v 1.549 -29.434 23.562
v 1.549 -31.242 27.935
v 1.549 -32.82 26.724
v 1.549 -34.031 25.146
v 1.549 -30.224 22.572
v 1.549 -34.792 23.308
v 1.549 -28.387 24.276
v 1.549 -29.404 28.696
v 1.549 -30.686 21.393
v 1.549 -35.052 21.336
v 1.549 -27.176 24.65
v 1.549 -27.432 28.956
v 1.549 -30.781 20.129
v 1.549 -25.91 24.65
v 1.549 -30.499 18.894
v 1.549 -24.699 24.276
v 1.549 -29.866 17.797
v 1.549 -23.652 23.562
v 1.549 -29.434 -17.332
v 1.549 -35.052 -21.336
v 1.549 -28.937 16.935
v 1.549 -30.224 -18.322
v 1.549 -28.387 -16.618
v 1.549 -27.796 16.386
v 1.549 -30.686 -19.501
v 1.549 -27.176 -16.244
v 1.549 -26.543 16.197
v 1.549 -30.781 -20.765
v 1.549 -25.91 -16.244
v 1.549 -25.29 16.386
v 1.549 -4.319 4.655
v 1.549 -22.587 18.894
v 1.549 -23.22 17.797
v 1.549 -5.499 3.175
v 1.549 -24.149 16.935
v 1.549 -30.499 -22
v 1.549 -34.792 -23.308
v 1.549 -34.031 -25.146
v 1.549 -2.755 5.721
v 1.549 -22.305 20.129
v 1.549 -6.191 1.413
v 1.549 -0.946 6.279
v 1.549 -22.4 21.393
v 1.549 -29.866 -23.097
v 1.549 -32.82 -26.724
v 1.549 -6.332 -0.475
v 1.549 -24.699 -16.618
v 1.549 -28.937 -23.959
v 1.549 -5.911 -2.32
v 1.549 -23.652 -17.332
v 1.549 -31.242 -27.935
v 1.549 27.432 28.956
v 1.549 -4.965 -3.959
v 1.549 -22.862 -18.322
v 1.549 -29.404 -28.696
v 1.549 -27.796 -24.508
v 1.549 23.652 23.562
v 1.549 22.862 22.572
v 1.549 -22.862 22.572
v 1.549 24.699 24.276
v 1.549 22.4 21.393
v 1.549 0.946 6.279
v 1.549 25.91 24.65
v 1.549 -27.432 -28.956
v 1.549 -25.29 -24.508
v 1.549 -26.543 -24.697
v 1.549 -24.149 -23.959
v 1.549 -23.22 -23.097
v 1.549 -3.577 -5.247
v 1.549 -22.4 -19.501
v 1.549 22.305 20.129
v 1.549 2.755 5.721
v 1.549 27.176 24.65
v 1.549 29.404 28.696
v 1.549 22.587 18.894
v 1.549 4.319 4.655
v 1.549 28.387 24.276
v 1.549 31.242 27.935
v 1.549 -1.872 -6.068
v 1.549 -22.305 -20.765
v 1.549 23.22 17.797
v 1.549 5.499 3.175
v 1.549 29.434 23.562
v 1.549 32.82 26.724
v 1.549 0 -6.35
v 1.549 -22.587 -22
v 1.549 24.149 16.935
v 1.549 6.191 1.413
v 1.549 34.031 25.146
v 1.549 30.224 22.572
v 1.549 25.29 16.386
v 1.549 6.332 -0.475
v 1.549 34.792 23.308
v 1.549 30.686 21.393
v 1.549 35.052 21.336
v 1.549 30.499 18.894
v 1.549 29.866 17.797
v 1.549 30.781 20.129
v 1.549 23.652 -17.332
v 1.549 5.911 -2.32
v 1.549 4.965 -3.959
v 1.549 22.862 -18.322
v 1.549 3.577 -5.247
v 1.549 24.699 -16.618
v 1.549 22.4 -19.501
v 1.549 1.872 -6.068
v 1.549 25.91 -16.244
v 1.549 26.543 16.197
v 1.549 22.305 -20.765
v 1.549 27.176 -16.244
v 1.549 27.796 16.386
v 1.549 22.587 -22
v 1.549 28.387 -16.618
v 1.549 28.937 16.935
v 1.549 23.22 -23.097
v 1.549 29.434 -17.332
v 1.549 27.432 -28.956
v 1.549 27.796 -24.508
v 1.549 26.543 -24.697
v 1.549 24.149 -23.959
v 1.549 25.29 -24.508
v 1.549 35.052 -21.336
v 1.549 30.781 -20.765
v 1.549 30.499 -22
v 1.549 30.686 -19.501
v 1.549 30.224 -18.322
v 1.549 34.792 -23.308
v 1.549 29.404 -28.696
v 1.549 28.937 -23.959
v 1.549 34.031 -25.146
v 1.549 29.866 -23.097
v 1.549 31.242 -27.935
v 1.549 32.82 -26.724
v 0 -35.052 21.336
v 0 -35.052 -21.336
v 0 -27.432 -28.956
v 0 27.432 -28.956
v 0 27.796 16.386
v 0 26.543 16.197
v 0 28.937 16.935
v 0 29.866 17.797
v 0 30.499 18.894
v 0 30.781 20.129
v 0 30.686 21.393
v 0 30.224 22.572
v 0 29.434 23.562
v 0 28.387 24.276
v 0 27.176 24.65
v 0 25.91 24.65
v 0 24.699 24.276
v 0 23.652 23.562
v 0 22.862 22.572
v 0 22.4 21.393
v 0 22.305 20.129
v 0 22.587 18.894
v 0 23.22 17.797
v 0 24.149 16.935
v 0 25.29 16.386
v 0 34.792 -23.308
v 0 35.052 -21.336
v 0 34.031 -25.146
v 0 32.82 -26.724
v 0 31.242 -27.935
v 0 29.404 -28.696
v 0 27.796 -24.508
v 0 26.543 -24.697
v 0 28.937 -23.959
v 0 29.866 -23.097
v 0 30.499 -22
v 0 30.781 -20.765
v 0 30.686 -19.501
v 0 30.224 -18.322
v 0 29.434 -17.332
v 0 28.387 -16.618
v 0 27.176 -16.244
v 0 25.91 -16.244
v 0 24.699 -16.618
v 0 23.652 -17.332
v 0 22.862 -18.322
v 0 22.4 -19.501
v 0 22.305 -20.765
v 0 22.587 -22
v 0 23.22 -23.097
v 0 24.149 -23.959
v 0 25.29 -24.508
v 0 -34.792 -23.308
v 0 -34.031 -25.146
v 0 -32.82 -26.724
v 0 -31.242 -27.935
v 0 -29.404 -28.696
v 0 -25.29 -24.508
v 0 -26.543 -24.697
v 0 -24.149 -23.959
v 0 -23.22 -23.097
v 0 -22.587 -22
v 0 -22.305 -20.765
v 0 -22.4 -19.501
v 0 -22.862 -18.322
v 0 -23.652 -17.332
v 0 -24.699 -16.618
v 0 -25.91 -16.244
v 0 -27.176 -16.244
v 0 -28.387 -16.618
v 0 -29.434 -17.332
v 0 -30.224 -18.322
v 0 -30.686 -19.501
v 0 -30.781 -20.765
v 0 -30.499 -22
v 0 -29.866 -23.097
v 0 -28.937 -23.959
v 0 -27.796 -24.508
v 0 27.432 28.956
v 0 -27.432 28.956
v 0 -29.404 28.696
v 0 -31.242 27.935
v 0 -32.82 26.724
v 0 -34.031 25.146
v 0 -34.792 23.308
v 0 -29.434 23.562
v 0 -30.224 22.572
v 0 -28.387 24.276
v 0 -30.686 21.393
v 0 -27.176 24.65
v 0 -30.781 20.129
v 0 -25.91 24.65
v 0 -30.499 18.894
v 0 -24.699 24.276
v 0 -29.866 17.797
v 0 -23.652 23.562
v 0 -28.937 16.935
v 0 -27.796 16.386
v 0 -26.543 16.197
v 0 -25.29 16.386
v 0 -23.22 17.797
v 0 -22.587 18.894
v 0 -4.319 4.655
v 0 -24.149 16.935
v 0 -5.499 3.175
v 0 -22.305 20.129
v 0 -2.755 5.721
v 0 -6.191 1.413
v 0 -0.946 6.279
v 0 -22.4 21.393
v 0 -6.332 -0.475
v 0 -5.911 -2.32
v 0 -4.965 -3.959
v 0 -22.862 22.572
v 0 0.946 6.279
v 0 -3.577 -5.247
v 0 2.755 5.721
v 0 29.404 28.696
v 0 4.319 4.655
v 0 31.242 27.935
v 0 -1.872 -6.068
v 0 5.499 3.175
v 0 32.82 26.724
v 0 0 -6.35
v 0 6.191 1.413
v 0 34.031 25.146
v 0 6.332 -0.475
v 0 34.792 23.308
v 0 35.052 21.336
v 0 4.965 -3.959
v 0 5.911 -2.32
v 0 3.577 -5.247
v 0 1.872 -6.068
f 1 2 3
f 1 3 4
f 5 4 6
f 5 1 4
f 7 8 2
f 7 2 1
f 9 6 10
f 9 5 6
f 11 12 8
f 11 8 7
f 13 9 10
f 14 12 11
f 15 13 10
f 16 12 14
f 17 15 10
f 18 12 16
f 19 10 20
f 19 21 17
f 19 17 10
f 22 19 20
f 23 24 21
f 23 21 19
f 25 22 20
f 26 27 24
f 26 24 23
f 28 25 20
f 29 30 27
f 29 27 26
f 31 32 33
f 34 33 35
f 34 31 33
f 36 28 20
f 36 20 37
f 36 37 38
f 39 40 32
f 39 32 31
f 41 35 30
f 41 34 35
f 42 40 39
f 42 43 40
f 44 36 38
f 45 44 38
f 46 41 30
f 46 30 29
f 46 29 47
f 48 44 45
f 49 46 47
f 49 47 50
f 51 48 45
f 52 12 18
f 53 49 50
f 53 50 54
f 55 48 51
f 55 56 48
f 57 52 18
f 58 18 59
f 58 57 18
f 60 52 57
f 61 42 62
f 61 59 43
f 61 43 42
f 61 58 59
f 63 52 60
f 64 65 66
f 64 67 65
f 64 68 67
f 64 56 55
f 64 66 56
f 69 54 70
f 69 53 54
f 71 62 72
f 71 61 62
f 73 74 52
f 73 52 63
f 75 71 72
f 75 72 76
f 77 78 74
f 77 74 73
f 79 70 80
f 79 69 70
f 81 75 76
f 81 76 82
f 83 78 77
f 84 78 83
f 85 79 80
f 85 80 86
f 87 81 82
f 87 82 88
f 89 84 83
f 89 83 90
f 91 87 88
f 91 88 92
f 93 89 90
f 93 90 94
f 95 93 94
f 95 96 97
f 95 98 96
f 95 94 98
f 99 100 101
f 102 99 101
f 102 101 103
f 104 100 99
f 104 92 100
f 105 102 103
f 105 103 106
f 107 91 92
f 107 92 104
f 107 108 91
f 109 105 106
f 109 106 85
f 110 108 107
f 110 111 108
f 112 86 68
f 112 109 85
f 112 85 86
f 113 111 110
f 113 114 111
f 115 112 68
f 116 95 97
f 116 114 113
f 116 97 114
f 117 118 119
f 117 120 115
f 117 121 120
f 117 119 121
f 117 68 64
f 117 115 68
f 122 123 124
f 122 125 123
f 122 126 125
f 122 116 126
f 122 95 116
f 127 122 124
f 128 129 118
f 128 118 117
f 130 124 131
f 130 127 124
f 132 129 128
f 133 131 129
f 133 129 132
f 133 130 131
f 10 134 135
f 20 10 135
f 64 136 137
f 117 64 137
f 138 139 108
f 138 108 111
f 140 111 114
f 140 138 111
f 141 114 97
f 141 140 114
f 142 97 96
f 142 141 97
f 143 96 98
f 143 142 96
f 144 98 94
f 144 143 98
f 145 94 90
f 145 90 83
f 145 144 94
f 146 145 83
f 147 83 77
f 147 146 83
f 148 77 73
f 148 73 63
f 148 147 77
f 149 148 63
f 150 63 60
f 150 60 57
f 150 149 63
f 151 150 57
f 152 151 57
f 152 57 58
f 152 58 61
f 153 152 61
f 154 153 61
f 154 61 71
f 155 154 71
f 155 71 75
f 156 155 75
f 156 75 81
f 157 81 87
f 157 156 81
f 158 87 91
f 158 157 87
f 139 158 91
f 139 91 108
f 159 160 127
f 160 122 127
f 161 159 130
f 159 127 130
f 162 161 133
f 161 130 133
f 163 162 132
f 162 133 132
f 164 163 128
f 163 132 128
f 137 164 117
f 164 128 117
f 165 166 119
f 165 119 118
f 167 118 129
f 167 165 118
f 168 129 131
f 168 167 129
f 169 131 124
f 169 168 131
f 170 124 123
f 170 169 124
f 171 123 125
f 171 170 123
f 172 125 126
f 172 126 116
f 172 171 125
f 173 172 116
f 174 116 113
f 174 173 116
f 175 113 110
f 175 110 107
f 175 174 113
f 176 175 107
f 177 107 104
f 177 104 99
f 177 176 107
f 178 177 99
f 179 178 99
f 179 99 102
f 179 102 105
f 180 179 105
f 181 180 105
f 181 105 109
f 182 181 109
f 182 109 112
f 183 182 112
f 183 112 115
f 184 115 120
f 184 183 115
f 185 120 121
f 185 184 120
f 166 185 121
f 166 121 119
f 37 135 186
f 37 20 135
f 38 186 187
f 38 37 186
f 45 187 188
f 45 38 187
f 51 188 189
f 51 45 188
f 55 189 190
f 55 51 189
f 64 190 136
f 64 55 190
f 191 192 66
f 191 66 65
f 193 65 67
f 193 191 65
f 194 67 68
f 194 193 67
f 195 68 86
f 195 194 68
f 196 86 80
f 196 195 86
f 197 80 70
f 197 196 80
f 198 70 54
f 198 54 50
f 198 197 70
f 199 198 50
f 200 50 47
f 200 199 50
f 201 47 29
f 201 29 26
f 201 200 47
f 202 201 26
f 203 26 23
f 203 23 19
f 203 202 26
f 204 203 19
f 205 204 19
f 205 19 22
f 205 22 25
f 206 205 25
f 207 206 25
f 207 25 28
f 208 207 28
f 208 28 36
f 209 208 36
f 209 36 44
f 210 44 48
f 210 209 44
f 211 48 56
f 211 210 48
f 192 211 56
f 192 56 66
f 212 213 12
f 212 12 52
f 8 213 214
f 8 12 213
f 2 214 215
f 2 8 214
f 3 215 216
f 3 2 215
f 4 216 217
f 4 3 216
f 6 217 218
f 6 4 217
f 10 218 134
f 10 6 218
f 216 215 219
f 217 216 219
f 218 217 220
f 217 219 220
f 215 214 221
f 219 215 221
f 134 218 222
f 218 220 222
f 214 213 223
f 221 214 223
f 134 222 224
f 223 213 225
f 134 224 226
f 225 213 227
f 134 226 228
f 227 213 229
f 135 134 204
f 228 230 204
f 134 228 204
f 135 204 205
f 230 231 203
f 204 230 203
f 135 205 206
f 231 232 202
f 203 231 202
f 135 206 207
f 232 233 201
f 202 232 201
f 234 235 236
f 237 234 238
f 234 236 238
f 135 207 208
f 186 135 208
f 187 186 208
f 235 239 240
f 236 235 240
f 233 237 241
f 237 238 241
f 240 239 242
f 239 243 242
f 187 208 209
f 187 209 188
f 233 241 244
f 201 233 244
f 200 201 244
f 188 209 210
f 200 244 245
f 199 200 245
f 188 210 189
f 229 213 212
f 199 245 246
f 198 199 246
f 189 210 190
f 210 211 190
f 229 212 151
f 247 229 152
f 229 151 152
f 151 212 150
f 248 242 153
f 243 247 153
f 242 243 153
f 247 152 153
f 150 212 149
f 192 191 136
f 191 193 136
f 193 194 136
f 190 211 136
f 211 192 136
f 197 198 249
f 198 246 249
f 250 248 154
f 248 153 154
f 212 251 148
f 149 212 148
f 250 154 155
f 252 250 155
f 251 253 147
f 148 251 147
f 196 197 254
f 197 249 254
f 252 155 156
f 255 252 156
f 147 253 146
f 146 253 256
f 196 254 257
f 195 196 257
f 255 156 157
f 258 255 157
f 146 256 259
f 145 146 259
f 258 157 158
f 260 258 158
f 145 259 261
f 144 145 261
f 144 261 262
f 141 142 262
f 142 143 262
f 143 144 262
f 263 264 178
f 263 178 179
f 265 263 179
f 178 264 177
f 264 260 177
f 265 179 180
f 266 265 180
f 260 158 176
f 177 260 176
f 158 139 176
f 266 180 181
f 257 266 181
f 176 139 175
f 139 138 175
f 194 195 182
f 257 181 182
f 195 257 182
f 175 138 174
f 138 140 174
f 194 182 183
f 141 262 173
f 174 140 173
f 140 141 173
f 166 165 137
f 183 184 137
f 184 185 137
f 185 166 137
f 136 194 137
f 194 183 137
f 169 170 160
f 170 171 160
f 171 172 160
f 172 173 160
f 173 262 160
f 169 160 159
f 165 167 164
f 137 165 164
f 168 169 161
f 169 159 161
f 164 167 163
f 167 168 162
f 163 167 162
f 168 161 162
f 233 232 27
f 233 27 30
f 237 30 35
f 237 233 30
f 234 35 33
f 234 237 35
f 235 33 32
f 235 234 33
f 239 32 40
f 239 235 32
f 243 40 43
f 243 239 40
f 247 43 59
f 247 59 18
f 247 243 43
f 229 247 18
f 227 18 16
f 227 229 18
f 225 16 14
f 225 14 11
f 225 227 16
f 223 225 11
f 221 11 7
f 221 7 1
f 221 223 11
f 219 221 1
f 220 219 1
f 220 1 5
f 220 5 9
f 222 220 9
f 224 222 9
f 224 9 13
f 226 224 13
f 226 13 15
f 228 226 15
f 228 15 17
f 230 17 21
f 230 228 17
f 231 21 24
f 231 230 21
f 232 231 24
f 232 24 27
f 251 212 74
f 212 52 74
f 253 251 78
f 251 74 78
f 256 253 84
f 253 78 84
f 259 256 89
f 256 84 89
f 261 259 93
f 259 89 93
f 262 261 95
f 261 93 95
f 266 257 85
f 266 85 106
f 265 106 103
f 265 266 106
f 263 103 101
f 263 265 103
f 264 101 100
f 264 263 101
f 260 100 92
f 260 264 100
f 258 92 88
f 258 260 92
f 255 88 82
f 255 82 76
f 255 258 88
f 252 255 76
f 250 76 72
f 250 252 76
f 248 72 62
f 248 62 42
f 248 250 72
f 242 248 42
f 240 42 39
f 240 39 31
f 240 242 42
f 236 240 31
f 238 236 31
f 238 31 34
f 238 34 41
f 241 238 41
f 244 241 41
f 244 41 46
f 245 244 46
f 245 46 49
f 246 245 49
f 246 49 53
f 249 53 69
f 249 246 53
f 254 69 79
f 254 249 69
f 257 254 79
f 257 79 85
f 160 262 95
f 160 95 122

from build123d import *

# Parameters (mm, degrees)
SKETCH1_W           = 57.912
SKETCH1_H           = 70.104
SKETCH1_R           = 4.25
SKETCH1_R_2         = 6.35
BOSS_EXTRUDE1_DEPTH = 1.5494
FILLET1_R           = 7.62


with BuildPart() as part:
    # Sketch1 → Boss-Extrude1 (new body)
    with BuildSketch(Plane(origin=(0, 0, 0), x_dir=(0, 0, -1), z_dir=(1, 0, 0))):
        Rectangle(SKETCH1_W, SKETCH1_H)
        with Locations((-20.447, 26.543)):
            Circle(SKETCH1_R, mode=Mode.SUBTRACT)
        with Locations((20.447, 26.543)):
            Circle(SKETCH1_R, mode=Mode.SUBTRACT)
        with Locations((20.447, -26.543)):
            Circle(SKETCH1_R, mode=Mode.SUBTRACT)
        with Locations((-20.447, -26.543)):
            Circle(SKETCH1_R, mode=Mode.SUBTRACT)
        Circle(SKETCH1_R_2, mode=Mode.SUBTRACT)
    extrude(amount=BOSS_EXTRUDE1_DEPTH)

    # Fillet1
    fillet1_edges = [part.edges().sort_by_distance(p)[0] for p in [
        (0.7747, -35.052, -28.956),
        (0.7747, -35.052, 28.956),
        (0.7747, 35.052, 28.956),
        (0.7747, 35.052, -28.956),
    ]]
    fillet(fillet1_edges, radius=FILLET1_R)


solid = part.part
